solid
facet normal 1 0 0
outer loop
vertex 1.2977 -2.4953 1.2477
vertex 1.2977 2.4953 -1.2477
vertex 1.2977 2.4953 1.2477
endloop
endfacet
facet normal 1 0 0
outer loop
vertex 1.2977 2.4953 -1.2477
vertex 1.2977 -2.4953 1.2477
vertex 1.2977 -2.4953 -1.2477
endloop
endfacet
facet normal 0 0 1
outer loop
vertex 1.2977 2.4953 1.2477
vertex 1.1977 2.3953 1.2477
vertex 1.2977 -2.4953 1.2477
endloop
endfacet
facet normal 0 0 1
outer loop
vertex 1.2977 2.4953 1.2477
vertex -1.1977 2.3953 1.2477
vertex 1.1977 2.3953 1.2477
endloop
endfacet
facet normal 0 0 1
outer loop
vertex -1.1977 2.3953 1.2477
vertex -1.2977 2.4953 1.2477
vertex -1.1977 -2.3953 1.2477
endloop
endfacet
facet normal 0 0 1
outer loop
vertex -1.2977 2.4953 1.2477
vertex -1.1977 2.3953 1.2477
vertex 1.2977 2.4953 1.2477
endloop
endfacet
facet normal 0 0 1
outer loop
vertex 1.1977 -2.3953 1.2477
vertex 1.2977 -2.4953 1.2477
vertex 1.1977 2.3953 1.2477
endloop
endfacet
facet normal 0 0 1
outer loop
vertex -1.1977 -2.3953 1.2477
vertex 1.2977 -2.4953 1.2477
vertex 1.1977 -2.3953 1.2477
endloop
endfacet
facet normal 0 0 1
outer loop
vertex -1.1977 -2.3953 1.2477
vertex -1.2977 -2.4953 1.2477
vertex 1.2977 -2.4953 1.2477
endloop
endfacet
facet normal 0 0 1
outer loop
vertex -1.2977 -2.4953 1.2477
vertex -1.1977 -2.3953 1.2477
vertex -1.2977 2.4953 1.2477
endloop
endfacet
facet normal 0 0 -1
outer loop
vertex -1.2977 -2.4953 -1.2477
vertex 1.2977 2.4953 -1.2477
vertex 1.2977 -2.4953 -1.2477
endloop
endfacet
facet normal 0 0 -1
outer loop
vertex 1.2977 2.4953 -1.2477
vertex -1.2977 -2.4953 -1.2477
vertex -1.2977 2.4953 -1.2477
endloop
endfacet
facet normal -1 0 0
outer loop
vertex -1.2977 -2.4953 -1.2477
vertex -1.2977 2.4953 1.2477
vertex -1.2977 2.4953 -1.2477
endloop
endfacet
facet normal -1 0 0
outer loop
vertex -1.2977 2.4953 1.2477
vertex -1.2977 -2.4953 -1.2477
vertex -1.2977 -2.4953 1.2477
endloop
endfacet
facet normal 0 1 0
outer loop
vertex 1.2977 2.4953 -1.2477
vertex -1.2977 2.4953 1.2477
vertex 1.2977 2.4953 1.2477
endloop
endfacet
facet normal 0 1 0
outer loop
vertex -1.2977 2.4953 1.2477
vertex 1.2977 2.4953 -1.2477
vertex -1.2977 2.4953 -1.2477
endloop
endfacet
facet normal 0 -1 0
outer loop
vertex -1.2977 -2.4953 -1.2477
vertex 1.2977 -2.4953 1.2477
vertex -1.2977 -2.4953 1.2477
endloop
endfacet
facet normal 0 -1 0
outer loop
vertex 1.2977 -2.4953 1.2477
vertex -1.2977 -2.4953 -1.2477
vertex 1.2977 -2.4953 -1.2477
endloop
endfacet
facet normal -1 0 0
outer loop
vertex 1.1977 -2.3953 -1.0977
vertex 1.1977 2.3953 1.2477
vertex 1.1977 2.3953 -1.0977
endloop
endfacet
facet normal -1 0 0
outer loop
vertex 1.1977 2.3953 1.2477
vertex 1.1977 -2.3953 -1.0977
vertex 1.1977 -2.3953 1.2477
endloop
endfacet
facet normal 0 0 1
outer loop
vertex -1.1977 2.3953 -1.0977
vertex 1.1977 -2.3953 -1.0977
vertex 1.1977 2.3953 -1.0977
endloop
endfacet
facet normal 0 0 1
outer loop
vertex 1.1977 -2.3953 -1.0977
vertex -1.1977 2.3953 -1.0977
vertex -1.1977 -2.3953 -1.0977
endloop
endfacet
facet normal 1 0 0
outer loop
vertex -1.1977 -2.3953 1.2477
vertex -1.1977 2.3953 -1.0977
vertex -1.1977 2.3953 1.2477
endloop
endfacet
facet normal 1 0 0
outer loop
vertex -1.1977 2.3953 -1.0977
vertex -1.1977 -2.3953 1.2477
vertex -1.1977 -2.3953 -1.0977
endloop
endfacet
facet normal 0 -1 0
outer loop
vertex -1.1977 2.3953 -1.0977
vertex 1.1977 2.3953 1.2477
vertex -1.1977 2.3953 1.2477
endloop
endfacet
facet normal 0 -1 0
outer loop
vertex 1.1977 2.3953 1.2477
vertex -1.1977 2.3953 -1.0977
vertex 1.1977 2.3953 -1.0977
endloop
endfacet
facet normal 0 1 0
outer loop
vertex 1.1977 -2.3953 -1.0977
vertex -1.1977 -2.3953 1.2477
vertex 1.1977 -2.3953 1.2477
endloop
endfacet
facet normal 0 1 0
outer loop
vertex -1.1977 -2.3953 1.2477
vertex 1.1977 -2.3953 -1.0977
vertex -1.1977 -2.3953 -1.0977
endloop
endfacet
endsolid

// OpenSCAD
p_num=10;
n_num=0;
d_num=0;
q_num=0;

p_gram=p_num*2.5;
n_gram=n_num*5;
d_gram=d_num*2.268;
q_gram=q_num*5.670;

coin_gram=p_gram+n_gram+d_gram+q_gram;

WtoL=0.5;
HtoL=0.5;

fluid_density=1;
PLA_density=1.3;

volume=1.1*coin_gram/fluid_density;

L=pow(volume/(WtoL*HtoL),0.3333);
W=L*WtoL;
H=L*HtoL;

difference(){
    cube([W+0.2,L+0.2,H+0.1],true);
    translate([0,0,0.1]) cube([W,L,H],true);
}
